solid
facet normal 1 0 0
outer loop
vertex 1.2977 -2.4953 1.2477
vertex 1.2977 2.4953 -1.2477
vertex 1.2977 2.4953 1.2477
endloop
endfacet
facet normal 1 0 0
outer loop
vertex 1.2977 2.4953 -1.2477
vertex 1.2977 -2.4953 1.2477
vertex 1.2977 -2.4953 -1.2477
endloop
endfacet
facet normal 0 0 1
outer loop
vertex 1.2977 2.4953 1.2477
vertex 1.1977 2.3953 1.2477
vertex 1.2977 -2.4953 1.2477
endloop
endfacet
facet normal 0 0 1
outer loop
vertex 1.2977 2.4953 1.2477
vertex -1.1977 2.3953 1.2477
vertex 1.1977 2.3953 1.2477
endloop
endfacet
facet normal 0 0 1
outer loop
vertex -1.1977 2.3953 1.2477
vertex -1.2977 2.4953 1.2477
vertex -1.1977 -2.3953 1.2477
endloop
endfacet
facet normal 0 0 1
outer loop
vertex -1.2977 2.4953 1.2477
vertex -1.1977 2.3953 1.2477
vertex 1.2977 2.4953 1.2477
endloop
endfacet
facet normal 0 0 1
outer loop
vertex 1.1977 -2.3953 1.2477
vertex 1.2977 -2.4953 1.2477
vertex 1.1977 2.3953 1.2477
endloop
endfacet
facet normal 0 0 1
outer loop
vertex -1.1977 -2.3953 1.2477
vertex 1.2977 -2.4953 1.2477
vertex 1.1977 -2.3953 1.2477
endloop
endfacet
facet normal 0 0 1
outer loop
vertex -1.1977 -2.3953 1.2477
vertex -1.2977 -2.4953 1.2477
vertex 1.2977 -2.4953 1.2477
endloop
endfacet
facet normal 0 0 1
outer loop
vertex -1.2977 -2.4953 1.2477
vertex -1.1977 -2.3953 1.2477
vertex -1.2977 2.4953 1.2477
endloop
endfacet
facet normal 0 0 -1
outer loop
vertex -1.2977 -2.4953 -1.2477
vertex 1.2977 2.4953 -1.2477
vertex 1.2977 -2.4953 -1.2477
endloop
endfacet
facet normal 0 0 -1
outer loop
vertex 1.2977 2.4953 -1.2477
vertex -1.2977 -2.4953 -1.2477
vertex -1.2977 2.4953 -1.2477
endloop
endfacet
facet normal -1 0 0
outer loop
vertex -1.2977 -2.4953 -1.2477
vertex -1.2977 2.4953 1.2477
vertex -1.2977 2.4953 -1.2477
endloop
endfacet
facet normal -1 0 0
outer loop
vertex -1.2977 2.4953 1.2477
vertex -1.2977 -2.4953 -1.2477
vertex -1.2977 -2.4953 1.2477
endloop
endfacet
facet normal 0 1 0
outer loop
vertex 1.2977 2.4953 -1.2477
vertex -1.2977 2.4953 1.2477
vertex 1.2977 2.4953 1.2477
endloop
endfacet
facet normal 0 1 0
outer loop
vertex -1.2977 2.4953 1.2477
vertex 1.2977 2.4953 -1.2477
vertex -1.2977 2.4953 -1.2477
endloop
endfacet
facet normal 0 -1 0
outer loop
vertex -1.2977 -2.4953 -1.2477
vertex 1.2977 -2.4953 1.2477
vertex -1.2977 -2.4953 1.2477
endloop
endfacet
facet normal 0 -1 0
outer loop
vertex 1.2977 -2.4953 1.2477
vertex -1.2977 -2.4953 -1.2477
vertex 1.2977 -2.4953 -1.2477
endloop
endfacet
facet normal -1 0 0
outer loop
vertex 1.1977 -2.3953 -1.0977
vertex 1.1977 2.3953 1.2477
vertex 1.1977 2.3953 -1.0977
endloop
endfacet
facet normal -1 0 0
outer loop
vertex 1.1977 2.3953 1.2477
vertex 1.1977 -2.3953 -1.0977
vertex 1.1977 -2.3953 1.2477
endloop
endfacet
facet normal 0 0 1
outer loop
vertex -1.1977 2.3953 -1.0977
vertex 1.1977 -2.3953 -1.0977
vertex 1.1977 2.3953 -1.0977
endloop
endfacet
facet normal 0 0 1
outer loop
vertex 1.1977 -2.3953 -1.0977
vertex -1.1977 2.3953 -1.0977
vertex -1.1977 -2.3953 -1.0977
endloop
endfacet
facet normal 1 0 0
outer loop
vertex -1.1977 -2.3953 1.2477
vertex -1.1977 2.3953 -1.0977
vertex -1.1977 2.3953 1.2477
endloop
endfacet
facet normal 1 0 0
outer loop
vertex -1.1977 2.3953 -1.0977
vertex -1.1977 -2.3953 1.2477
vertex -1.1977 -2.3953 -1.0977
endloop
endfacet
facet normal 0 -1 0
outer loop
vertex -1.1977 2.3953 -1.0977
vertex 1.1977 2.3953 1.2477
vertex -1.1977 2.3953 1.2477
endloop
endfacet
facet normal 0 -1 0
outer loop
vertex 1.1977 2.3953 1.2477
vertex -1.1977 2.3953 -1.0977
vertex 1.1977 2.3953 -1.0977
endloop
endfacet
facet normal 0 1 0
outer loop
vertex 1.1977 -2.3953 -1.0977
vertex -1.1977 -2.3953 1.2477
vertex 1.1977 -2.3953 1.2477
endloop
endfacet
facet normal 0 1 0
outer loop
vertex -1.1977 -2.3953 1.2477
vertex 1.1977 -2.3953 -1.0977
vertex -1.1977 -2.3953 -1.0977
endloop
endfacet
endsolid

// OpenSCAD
p_num=10;
n_num=0;
d_num=0;
q_num=0;

p_gram=p_num*2.5;
n_gram=n_num*5;
d_gram=d_num*2.268;
q_gram=q_num*5.670;

coin_gram=p_gram+n_gram+d_gram+q_gram;

WtoL=0.5;
HtoL=0.5;

fluid_density=1;
PLA_density=1.3;

volume=1.1*coin_gram/fluid_density;

L=pow(volume/(WtoL*HtoL),0.3333);
W=L*WtoL;
H=L*HtoL;

difference(){
    cube([W+0.2,L+0.2,H+0.1],true);
    translate([0,0,0.1]) cube([W,L,H],true);
}
